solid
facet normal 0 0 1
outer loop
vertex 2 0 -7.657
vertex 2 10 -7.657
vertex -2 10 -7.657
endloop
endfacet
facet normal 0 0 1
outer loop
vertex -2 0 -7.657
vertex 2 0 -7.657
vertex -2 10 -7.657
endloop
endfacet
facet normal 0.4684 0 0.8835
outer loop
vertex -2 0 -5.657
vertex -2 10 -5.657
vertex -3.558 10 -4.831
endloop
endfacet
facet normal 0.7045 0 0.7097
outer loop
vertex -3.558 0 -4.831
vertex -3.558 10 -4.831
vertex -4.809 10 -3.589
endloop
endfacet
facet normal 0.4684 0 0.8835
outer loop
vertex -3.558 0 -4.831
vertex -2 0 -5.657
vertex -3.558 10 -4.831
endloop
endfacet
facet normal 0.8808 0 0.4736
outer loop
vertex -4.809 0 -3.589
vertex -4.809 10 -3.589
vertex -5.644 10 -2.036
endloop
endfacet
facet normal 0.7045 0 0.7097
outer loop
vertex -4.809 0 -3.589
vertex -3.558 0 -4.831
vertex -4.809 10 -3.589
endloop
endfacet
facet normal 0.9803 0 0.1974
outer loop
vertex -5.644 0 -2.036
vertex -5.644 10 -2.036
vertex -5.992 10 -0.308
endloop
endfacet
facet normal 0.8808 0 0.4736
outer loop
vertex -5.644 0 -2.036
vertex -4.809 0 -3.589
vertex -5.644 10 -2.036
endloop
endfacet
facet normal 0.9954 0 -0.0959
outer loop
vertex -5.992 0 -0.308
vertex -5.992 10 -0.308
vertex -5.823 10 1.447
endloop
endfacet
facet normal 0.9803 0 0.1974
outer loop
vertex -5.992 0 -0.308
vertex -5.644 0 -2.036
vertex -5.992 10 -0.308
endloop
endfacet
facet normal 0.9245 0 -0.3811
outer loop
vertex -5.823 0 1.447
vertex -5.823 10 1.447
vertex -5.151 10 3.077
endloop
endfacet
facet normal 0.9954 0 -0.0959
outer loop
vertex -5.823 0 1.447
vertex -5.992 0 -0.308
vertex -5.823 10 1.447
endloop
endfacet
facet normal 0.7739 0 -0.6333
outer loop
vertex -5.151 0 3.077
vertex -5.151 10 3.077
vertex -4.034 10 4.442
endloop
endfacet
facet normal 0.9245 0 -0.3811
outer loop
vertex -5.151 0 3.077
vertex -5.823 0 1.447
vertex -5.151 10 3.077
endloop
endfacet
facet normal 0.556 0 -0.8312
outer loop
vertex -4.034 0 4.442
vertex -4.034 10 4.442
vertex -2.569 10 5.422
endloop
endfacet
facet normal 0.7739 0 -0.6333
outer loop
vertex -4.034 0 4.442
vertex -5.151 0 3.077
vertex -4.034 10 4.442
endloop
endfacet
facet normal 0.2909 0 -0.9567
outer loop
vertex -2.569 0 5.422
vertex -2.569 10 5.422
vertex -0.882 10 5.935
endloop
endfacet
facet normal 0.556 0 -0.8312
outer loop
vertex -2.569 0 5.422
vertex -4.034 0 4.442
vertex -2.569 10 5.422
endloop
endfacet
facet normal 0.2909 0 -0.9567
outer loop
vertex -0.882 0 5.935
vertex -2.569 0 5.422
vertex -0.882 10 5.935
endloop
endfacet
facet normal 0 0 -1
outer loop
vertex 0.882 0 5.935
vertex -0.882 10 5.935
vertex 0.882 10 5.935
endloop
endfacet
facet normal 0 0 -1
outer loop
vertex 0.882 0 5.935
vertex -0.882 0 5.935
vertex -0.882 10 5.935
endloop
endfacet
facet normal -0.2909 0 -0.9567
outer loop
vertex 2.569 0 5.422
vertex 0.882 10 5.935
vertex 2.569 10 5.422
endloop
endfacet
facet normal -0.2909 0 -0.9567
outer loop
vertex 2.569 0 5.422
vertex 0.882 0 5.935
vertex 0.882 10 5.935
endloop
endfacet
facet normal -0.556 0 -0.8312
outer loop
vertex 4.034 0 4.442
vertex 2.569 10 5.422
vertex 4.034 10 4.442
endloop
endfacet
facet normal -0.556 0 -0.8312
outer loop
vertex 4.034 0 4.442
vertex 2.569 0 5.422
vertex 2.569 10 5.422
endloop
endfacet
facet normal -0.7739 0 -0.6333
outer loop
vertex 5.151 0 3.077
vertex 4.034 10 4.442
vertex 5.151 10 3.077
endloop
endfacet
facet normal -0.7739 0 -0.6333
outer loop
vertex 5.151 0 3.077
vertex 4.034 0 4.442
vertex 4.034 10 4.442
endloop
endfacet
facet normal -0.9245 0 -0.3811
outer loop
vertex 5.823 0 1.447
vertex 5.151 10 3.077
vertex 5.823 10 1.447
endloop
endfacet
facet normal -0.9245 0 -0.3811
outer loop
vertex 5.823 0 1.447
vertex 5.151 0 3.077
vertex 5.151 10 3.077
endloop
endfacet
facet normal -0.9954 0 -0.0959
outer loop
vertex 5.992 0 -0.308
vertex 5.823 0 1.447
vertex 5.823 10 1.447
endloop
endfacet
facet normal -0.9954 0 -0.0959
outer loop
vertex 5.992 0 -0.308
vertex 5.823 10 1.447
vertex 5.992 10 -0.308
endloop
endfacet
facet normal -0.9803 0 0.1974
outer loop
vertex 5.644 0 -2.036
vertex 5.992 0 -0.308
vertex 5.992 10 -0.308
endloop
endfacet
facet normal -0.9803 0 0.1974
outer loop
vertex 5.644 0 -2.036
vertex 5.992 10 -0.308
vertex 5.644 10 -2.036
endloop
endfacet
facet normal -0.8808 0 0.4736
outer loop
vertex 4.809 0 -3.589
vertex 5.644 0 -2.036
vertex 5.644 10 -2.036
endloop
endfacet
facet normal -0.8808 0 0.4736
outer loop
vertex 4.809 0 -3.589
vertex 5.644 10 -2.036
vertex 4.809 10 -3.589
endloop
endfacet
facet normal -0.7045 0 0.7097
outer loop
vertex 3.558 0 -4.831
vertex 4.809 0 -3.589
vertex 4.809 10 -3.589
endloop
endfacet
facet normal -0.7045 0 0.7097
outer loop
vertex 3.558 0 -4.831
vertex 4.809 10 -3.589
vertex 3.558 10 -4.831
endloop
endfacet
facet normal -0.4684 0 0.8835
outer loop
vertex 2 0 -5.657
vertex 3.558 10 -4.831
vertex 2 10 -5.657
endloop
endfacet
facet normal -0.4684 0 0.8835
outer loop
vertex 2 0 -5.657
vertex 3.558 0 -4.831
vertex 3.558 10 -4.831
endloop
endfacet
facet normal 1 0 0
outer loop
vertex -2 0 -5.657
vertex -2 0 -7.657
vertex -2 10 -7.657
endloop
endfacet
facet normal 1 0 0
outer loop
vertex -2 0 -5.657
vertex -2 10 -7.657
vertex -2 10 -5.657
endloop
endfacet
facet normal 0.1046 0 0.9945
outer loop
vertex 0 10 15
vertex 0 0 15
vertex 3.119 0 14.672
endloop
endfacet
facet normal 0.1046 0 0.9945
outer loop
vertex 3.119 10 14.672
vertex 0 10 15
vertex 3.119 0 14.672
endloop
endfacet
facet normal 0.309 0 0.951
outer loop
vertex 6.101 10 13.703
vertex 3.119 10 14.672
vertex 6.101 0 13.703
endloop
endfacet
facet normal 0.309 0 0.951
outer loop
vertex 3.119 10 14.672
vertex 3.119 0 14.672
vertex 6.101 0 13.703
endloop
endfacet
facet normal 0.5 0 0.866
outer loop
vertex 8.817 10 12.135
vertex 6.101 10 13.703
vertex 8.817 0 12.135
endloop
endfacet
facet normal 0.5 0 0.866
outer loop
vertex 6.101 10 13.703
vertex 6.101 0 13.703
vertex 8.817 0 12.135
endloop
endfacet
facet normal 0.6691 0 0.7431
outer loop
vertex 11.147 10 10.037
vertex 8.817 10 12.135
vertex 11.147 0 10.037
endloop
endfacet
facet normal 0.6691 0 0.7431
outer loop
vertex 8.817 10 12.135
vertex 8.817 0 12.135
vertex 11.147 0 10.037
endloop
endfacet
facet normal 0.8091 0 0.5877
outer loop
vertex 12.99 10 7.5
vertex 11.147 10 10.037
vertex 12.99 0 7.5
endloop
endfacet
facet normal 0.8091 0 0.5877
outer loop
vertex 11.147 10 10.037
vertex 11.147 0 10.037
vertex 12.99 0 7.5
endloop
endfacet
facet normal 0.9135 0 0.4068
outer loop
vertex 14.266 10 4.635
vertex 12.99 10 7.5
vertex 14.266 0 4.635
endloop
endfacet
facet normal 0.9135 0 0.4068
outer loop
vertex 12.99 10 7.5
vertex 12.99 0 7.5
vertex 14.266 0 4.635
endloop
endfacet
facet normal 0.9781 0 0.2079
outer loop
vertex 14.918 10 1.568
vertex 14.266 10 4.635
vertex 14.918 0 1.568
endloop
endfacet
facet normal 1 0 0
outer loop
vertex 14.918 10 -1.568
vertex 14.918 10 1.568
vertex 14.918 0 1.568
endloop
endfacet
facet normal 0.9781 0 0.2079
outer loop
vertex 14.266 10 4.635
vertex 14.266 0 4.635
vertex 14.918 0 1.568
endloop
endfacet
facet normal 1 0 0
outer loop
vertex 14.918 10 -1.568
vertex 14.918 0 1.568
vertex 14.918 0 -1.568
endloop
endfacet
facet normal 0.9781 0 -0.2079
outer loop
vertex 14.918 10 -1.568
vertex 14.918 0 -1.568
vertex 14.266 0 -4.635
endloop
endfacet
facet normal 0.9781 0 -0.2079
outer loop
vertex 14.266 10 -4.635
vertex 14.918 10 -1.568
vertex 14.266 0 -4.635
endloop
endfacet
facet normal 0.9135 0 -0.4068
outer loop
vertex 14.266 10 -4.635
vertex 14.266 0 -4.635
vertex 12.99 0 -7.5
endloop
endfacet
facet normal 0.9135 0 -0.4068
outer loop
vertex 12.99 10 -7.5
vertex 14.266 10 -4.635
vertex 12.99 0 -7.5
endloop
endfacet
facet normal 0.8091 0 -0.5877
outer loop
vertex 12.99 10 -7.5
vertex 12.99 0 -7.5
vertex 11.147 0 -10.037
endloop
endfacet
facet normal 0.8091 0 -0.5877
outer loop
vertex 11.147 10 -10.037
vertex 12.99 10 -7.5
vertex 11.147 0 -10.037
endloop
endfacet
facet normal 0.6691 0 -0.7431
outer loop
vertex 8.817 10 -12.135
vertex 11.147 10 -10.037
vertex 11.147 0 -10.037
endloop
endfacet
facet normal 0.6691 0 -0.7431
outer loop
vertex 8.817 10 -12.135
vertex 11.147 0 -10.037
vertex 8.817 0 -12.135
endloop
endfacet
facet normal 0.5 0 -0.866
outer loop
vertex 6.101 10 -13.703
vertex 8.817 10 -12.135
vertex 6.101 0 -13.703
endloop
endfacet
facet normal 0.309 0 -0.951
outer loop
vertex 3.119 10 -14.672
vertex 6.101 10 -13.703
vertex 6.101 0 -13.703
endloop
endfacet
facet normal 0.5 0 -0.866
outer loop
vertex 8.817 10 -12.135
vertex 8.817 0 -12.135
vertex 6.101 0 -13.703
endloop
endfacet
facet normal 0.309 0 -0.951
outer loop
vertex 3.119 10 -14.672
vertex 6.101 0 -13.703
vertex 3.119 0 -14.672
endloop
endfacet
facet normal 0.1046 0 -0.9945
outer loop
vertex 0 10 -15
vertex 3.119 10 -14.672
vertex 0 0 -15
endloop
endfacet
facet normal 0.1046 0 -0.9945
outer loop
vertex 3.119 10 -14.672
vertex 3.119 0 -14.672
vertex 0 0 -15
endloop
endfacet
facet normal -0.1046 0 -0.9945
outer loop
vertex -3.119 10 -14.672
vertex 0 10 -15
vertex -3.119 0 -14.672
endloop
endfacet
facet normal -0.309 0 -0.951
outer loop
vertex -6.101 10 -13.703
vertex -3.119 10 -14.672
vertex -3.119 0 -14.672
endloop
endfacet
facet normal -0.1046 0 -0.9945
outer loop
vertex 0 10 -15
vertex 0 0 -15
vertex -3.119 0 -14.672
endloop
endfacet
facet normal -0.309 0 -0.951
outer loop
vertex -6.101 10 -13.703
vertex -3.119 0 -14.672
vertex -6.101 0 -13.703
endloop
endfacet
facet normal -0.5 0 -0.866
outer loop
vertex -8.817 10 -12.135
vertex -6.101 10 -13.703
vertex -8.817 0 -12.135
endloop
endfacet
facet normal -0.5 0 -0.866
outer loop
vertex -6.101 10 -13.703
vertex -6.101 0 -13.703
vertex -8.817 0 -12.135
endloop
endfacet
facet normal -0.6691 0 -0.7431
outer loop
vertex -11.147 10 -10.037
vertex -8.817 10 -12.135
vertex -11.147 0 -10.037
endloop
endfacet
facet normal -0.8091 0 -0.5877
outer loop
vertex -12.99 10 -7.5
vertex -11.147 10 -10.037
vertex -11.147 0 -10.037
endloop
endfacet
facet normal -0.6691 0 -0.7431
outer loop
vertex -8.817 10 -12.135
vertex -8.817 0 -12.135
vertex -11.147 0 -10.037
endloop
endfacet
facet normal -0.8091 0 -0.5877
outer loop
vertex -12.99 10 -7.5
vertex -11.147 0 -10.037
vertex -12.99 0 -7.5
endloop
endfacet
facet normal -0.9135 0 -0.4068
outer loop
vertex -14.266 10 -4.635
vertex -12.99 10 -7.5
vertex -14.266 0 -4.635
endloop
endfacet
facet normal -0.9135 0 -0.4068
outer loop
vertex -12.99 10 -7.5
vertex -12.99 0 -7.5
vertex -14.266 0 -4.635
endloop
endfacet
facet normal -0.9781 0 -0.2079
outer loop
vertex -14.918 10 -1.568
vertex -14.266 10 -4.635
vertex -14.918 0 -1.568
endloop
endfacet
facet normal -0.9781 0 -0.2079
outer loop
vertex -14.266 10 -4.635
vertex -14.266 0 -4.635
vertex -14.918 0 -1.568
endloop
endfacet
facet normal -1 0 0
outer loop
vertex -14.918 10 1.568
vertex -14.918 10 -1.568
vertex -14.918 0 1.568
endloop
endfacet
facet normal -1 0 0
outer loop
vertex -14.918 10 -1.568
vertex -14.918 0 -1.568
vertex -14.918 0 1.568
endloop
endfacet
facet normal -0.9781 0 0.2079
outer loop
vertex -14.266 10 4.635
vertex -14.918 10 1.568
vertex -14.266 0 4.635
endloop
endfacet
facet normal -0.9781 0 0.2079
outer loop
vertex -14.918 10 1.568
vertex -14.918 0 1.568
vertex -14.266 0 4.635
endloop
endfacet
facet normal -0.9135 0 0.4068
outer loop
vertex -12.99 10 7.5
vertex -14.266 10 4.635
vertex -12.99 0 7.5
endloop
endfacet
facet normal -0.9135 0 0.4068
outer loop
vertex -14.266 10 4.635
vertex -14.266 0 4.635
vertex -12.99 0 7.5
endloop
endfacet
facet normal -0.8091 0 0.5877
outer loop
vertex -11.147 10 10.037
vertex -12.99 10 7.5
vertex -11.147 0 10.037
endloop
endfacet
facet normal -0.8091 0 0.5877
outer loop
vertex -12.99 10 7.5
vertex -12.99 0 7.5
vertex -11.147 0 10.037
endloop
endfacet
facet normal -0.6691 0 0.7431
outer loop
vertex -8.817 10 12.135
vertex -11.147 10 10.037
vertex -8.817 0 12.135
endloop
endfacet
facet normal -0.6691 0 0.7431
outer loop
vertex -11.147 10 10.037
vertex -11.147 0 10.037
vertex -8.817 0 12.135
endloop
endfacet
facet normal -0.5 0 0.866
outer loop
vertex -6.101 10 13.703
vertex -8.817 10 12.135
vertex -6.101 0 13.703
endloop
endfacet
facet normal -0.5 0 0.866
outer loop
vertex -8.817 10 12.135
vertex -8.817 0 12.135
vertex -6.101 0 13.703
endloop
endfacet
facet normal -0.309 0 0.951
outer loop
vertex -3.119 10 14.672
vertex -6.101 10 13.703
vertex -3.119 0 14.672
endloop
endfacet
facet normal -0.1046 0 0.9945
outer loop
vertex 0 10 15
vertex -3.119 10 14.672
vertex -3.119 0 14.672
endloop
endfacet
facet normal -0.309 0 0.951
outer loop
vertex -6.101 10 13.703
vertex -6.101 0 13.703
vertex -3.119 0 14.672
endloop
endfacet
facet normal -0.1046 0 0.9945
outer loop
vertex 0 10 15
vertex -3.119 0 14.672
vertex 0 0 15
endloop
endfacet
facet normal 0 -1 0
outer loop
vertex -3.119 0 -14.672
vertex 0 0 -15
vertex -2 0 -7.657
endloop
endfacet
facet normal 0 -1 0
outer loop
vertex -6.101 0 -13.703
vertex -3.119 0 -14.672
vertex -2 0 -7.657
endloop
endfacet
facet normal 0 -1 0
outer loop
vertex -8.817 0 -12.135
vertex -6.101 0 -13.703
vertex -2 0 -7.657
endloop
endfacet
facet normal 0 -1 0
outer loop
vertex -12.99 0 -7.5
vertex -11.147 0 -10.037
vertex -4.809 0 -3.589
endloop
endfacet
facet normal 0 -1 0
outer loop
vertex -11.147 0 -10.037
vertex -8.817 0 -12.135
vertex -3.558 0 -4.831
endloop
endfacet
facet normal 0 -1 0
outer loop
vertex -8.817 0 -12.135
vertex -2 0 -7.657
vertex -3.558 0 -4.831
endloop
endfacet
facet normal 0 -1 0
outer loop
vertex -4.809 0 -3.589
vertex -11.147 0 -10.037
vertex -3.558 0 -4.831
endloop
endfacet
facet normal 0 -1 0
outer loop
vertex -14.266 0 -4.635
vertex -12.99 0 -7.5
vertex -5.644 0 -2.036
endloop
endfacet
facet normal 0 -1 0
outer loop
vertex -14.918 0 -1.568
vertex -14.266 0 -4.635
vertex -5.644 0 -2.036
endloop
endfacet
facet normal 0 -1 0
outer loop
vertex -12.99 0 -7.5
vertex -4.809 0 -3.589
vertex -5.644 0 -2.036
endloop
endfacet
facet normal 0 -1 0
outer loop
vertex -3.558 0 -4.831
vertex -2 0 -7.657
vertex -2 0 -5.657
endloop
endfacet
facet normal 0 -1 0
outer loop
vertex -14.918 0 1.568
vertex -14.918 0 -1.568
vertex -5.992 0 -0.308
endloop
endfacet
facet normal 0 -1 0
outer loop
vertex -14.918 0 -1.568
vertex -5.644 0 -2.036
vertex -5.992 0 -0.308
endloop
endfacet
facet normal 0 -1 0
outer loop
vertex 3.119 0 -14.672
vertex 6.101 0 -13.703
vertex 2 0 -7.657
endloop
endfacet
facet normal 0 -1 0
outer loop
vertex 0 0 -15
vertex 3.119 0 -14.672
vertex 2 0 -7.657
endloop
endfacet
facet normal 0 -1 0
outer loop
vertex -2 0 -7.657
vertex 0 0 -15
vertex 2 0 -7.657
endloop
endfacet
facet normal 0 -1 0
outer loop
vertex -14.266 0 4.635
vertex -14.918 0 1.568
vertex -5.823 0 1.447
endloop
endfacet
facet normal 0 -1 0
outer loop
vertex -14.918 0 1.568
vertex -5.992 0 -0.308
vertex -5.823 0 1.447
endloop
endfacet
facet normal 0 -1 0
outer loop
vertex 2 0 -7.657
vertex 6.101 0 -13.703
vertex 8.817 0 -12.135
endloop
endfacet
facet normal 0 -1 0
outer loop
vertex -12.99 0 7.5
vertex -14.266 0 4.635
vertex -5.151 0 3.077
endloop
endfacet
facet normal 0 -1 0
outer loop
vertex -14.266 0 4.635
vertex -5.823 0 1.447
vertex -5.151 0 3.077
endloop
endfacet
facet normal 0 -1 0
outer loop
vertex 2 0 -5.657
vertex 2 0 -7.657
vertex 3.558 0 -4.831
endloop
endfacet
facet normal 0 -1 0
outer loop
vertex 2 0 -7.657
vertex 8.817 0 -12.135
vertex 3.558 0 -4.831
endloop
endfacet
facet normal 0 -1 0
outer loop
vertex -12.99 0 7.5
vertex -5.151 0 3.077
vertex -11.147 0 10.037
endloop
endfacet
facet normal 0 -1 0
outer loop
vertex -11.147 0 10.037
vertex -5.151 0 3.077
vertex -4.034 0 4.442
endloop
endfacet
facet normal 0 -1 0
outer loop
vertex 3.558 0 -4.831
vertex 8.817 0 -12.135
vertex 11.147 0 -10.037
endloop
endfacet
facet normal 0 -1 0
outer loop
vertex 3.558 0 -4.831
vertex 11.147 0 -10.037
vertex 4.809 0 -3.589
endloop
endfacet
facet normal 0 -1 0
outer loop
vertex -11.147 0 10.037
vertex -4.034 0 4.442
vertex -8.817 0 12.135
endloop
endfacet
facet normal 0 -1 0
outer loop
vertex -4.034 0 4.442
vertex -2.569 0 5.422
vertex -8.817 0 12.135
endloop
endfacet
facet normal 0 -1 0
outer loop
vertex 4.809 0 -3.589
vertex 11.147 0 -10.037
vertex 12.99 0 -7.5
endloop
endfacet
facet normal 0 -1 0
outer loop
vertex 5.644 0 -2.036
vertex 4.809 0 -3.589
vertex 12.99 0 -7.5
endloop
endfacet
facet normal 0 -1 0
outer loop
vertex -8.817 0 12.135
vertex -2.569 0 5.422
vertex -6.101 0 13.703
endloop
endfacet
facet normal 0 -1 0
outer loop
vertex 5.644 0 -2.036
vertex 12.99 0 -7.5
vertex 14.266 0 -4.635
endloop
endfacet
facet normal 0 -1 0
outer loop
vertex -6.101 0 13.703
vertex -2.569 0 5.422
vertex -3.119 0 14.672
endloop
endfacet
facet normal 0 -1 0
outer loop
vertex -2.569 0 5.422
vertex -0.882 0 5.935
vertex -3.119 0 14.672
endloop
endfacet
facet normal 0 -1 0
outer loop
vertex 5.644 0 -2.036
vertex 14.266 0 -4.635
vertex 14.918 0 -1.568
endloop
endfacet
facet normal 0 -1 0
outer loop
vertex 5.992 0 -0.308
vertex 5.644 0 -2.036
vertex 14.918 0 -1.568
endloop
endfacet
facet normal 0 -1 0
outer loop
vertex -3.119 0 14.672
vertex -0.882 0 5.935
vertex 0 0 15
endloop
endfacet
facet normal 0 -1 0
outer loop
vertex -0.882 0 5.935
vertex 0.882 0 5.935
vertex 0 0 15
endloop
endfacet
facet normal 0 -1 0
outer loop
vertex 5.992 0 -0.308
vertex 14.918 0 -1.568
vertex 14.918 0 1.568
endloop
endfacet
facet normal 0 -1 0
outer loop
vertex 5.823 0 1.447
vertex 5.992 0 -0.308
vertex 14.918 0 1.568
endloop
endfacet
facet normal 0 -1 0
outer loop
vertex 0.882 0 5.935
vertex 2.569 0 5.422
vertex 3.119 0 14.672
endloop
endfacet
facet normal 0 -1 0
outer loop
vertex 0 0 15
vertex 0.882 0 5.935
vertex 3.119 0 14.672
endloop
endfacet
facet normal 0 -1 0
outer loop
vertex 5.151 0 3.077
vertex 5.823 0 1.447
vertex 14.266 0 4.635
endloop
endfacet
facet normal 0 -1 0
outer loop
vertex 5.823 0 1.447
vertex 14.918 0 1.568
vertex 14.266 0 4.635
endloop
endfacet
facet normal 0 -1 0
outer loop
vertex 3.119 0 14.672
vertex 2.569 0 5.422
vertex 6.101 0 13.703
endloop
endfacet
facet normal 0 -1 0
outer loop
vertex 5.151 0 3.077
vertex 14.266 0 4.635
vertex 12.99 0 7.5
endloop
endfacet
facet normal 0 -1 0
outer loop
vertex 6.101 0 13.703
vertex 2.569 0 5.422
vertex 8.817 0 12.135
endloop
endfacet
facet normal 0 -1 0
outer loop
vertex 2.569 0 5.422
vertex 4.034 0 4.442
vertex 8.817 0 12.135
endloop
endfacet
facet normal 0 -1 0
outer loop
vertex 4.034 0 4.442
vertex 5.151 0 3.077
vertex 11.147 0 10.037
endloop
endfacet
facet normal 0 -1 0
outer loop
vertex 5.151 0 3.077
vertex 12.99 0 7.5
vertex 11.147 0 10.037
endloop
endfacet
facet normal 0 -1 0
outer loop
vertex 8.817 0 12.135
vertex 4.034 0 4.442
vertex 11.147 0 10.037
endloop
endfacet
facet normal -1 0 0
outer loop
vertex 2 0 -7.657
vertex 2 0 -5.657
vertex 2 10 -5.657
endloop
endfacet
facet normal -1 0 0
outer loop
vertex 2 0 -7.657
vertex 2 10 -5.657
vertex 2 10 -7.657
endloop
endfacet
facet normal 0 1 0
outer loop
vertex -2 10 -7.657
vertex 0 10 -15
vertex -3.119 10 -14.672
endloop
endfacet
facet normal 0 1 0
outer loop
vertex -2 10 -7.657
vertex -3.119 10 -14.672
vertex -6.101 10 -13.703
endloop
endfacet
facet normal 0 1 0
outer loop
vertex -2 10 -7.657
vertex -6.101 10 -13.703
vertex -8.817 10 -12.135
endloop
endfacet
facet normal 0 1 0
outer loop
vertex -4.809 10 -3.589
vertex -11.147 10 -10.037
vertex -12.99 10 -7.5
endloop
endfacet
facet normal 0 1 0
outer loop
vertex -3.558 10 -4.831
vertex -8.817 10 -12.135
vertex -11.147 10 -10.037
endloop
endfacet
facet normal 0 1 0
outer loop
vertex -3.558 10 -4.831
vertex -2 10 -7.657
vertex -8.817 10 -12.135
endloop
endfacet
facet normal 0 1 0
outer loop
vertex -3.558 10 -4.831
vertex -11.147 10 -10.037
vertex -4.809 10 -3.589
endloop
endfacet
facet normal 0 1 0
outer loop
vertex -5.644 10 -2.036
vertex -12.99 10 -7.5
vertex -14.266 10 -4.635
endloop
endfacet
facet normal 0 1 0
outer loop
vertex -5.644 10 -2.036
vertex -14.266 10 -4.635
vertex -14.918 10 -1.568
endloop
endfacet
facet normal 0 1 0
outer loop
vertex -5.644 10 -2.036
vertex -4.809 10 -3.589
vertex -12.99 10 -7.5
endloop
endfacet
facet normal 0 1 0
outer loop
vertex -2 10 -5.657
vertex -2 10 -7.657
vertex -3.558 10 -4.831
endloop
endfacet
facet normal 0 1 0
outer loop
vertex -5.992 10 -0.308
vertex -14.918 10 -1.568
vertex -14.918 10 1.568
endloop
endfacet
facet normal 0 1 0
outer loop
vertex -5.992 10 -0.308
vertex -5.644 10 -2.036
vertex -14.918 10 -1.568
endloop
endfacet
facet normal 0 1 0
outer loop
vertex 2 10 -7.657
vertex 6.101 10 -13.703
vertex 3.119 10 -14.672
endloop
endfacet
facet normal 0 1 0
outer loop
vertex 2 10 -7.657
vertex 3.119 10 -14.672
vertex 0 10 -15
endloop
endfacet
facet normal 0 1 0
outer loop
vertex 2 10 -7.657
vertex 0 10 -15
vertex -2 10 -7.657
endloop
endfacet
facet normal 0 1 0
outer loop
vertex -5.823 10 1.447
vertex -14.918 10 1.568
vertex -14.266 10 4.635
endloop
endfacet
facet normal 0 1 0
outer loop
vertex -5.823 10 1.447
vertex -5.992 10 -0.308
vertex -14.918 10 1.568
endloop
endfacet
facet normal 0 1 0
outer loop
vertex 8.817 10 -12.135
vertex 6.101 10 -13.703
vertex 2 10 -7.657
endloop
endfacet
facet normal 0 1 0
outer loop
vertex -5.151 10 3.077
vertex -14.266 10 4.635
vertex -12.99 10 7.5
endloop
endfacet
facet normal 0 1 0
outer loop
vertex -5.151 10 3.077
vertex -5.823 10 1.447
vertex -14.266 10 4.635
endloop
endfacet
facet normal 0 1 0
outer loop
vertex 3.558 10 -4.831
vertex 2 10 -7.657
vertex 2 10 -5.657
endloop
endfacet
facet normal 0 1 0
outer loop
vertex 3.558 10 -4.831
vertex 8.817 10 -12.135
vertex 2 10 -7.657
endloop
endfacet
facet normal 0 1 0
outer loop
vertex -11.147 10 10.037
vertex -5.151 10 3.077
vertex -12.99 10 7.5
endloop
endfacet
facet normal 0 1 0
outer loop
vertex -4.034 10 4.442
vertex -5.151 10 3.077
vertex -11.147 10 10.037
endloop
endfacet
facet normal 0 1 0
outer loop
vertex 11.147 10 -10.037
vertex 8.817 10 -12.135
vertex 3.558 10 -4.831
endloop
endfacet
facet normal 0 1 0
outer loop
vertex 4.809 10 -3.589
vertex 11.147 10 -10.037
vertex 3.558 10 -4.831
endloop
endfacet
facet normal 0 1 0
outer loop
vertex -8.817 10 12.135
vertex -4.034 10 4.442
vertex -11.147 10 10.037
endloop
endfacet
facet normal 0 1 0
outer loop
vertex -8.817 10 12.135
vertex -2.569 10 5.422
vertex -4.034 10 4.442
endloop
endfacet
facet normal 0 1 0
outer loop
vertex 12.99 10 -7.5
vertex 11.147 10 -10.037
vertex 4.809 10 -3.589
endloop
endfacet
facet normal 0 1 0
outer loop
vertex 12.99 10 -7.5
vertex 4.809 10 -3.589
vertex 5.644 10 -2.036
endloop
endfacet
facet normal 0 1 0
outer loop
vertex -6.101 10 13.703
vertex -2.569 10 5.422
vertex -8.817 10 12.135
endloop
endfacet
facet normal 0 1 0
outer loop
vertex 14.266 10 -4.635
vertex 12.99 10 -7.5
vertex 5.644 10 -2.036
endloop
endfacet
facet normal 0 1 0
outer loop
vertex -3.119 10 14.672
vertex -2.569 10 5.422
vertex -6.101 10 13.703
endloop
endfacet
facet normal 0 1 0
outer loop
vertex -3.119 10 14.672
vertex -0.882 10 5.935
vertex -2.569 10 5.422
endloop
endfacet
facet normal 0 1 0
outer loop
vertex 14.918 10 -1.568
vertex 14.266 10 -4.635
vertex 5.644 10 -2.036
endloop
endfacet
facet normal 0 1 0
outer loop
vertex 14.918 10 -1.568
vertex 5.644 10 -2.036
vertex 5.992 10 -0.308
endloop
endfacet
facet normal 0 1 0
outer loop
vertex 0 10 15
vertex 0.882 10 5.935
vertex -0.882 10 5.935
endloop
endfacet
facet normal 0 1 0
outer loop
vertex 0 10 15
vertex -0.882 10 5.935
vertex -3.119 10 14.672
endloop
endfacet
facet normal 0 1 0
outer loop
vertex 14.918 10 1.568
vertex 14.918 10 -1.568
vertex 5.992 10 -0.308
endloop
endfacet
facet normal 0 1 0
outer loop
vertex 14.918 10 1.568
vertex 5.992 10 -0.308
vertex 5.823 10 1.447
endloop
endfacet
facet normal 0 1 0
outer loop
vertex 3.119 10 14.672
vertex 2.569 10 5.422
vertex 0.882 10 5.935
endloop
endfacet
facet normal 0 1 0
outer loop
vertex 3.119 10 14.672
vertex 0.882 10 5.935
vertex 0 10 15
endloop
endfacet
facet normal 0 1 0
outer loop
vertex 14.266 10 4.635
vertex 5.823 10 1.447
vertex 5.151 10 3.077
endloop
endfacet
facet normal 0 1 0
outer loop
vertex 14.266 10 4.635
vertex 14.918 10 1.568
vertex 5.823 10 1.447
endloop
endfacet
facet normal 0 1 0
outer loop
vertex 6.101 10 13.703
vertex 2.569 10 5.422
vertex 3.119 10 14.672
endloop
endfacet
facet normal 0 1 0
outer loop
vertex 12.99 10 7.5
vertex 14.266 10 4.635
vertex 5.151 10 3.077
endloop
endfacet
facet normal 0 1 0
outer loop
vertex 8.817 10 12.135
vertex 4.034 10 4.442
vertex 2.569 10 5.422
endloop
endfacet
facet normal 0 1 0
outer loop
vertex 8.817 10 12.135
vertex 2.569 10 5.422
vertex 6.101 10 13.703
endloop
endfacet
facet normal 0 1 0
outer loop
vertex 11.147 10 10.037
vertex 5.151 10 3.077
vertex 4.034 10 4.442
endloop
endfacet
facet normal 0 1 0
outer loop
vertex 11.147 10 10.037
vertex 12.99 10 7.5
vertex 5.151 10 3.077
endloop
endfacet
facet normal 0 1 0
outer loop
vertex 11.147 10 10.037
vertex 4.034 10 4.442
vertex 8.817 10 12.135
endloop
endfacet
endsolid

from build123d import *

# Parameters (mm, degrees)
SKETCH1_R           = 15
SKETCH1_R_2         = 6
BOSS_EXTRUDE1_DEPTH = 10
CUT_EXTRUDE1_DEPTH  = 24.452078799


with BuildPart() as part:
    # Sketch1 → Boss-Extrude1 (new body)
    with BuildSketch(Plane(origin=(0, 0, 0), x_dir=(1, 0, 0), z_dir=(0, 1, 0))):
        with Locations(Location((0, 0, 0), (0, 0, 270))):
            Circle(SKETCH1_R)
        with Locations(Location((0, 0, 0), (0, 0, 270))):
            Circle(SKETCH1_R_2, mode=Mode.SUBTRACT)
    extrude(amount=BOSS_EXTRUDE1_DEPTH)

    # Sketch2 → Cut-Extrude1 (cut, through all)
    with BuildSketch(Plane(origin=(0, 10, 0), x_dir=(1, 0, 0), z_dir=(0, 1, 0))):
        with BuildLine():
            Line((2, 5.656854249), (2, 7.656854249))
            Line((2, 7.656854249), (-2, 7.656854249))
            Line((-2, 7.656854249), (-2, 5.656854249))
            ThreePointArc((-2, 5.656854249), (0, 6), (2, 5.656854249))
        make_face()
    extrude(amount=-CUT_EXTRUDE1_DEPTH, mode=Mode.SUBTRACT)


solid = part.part
